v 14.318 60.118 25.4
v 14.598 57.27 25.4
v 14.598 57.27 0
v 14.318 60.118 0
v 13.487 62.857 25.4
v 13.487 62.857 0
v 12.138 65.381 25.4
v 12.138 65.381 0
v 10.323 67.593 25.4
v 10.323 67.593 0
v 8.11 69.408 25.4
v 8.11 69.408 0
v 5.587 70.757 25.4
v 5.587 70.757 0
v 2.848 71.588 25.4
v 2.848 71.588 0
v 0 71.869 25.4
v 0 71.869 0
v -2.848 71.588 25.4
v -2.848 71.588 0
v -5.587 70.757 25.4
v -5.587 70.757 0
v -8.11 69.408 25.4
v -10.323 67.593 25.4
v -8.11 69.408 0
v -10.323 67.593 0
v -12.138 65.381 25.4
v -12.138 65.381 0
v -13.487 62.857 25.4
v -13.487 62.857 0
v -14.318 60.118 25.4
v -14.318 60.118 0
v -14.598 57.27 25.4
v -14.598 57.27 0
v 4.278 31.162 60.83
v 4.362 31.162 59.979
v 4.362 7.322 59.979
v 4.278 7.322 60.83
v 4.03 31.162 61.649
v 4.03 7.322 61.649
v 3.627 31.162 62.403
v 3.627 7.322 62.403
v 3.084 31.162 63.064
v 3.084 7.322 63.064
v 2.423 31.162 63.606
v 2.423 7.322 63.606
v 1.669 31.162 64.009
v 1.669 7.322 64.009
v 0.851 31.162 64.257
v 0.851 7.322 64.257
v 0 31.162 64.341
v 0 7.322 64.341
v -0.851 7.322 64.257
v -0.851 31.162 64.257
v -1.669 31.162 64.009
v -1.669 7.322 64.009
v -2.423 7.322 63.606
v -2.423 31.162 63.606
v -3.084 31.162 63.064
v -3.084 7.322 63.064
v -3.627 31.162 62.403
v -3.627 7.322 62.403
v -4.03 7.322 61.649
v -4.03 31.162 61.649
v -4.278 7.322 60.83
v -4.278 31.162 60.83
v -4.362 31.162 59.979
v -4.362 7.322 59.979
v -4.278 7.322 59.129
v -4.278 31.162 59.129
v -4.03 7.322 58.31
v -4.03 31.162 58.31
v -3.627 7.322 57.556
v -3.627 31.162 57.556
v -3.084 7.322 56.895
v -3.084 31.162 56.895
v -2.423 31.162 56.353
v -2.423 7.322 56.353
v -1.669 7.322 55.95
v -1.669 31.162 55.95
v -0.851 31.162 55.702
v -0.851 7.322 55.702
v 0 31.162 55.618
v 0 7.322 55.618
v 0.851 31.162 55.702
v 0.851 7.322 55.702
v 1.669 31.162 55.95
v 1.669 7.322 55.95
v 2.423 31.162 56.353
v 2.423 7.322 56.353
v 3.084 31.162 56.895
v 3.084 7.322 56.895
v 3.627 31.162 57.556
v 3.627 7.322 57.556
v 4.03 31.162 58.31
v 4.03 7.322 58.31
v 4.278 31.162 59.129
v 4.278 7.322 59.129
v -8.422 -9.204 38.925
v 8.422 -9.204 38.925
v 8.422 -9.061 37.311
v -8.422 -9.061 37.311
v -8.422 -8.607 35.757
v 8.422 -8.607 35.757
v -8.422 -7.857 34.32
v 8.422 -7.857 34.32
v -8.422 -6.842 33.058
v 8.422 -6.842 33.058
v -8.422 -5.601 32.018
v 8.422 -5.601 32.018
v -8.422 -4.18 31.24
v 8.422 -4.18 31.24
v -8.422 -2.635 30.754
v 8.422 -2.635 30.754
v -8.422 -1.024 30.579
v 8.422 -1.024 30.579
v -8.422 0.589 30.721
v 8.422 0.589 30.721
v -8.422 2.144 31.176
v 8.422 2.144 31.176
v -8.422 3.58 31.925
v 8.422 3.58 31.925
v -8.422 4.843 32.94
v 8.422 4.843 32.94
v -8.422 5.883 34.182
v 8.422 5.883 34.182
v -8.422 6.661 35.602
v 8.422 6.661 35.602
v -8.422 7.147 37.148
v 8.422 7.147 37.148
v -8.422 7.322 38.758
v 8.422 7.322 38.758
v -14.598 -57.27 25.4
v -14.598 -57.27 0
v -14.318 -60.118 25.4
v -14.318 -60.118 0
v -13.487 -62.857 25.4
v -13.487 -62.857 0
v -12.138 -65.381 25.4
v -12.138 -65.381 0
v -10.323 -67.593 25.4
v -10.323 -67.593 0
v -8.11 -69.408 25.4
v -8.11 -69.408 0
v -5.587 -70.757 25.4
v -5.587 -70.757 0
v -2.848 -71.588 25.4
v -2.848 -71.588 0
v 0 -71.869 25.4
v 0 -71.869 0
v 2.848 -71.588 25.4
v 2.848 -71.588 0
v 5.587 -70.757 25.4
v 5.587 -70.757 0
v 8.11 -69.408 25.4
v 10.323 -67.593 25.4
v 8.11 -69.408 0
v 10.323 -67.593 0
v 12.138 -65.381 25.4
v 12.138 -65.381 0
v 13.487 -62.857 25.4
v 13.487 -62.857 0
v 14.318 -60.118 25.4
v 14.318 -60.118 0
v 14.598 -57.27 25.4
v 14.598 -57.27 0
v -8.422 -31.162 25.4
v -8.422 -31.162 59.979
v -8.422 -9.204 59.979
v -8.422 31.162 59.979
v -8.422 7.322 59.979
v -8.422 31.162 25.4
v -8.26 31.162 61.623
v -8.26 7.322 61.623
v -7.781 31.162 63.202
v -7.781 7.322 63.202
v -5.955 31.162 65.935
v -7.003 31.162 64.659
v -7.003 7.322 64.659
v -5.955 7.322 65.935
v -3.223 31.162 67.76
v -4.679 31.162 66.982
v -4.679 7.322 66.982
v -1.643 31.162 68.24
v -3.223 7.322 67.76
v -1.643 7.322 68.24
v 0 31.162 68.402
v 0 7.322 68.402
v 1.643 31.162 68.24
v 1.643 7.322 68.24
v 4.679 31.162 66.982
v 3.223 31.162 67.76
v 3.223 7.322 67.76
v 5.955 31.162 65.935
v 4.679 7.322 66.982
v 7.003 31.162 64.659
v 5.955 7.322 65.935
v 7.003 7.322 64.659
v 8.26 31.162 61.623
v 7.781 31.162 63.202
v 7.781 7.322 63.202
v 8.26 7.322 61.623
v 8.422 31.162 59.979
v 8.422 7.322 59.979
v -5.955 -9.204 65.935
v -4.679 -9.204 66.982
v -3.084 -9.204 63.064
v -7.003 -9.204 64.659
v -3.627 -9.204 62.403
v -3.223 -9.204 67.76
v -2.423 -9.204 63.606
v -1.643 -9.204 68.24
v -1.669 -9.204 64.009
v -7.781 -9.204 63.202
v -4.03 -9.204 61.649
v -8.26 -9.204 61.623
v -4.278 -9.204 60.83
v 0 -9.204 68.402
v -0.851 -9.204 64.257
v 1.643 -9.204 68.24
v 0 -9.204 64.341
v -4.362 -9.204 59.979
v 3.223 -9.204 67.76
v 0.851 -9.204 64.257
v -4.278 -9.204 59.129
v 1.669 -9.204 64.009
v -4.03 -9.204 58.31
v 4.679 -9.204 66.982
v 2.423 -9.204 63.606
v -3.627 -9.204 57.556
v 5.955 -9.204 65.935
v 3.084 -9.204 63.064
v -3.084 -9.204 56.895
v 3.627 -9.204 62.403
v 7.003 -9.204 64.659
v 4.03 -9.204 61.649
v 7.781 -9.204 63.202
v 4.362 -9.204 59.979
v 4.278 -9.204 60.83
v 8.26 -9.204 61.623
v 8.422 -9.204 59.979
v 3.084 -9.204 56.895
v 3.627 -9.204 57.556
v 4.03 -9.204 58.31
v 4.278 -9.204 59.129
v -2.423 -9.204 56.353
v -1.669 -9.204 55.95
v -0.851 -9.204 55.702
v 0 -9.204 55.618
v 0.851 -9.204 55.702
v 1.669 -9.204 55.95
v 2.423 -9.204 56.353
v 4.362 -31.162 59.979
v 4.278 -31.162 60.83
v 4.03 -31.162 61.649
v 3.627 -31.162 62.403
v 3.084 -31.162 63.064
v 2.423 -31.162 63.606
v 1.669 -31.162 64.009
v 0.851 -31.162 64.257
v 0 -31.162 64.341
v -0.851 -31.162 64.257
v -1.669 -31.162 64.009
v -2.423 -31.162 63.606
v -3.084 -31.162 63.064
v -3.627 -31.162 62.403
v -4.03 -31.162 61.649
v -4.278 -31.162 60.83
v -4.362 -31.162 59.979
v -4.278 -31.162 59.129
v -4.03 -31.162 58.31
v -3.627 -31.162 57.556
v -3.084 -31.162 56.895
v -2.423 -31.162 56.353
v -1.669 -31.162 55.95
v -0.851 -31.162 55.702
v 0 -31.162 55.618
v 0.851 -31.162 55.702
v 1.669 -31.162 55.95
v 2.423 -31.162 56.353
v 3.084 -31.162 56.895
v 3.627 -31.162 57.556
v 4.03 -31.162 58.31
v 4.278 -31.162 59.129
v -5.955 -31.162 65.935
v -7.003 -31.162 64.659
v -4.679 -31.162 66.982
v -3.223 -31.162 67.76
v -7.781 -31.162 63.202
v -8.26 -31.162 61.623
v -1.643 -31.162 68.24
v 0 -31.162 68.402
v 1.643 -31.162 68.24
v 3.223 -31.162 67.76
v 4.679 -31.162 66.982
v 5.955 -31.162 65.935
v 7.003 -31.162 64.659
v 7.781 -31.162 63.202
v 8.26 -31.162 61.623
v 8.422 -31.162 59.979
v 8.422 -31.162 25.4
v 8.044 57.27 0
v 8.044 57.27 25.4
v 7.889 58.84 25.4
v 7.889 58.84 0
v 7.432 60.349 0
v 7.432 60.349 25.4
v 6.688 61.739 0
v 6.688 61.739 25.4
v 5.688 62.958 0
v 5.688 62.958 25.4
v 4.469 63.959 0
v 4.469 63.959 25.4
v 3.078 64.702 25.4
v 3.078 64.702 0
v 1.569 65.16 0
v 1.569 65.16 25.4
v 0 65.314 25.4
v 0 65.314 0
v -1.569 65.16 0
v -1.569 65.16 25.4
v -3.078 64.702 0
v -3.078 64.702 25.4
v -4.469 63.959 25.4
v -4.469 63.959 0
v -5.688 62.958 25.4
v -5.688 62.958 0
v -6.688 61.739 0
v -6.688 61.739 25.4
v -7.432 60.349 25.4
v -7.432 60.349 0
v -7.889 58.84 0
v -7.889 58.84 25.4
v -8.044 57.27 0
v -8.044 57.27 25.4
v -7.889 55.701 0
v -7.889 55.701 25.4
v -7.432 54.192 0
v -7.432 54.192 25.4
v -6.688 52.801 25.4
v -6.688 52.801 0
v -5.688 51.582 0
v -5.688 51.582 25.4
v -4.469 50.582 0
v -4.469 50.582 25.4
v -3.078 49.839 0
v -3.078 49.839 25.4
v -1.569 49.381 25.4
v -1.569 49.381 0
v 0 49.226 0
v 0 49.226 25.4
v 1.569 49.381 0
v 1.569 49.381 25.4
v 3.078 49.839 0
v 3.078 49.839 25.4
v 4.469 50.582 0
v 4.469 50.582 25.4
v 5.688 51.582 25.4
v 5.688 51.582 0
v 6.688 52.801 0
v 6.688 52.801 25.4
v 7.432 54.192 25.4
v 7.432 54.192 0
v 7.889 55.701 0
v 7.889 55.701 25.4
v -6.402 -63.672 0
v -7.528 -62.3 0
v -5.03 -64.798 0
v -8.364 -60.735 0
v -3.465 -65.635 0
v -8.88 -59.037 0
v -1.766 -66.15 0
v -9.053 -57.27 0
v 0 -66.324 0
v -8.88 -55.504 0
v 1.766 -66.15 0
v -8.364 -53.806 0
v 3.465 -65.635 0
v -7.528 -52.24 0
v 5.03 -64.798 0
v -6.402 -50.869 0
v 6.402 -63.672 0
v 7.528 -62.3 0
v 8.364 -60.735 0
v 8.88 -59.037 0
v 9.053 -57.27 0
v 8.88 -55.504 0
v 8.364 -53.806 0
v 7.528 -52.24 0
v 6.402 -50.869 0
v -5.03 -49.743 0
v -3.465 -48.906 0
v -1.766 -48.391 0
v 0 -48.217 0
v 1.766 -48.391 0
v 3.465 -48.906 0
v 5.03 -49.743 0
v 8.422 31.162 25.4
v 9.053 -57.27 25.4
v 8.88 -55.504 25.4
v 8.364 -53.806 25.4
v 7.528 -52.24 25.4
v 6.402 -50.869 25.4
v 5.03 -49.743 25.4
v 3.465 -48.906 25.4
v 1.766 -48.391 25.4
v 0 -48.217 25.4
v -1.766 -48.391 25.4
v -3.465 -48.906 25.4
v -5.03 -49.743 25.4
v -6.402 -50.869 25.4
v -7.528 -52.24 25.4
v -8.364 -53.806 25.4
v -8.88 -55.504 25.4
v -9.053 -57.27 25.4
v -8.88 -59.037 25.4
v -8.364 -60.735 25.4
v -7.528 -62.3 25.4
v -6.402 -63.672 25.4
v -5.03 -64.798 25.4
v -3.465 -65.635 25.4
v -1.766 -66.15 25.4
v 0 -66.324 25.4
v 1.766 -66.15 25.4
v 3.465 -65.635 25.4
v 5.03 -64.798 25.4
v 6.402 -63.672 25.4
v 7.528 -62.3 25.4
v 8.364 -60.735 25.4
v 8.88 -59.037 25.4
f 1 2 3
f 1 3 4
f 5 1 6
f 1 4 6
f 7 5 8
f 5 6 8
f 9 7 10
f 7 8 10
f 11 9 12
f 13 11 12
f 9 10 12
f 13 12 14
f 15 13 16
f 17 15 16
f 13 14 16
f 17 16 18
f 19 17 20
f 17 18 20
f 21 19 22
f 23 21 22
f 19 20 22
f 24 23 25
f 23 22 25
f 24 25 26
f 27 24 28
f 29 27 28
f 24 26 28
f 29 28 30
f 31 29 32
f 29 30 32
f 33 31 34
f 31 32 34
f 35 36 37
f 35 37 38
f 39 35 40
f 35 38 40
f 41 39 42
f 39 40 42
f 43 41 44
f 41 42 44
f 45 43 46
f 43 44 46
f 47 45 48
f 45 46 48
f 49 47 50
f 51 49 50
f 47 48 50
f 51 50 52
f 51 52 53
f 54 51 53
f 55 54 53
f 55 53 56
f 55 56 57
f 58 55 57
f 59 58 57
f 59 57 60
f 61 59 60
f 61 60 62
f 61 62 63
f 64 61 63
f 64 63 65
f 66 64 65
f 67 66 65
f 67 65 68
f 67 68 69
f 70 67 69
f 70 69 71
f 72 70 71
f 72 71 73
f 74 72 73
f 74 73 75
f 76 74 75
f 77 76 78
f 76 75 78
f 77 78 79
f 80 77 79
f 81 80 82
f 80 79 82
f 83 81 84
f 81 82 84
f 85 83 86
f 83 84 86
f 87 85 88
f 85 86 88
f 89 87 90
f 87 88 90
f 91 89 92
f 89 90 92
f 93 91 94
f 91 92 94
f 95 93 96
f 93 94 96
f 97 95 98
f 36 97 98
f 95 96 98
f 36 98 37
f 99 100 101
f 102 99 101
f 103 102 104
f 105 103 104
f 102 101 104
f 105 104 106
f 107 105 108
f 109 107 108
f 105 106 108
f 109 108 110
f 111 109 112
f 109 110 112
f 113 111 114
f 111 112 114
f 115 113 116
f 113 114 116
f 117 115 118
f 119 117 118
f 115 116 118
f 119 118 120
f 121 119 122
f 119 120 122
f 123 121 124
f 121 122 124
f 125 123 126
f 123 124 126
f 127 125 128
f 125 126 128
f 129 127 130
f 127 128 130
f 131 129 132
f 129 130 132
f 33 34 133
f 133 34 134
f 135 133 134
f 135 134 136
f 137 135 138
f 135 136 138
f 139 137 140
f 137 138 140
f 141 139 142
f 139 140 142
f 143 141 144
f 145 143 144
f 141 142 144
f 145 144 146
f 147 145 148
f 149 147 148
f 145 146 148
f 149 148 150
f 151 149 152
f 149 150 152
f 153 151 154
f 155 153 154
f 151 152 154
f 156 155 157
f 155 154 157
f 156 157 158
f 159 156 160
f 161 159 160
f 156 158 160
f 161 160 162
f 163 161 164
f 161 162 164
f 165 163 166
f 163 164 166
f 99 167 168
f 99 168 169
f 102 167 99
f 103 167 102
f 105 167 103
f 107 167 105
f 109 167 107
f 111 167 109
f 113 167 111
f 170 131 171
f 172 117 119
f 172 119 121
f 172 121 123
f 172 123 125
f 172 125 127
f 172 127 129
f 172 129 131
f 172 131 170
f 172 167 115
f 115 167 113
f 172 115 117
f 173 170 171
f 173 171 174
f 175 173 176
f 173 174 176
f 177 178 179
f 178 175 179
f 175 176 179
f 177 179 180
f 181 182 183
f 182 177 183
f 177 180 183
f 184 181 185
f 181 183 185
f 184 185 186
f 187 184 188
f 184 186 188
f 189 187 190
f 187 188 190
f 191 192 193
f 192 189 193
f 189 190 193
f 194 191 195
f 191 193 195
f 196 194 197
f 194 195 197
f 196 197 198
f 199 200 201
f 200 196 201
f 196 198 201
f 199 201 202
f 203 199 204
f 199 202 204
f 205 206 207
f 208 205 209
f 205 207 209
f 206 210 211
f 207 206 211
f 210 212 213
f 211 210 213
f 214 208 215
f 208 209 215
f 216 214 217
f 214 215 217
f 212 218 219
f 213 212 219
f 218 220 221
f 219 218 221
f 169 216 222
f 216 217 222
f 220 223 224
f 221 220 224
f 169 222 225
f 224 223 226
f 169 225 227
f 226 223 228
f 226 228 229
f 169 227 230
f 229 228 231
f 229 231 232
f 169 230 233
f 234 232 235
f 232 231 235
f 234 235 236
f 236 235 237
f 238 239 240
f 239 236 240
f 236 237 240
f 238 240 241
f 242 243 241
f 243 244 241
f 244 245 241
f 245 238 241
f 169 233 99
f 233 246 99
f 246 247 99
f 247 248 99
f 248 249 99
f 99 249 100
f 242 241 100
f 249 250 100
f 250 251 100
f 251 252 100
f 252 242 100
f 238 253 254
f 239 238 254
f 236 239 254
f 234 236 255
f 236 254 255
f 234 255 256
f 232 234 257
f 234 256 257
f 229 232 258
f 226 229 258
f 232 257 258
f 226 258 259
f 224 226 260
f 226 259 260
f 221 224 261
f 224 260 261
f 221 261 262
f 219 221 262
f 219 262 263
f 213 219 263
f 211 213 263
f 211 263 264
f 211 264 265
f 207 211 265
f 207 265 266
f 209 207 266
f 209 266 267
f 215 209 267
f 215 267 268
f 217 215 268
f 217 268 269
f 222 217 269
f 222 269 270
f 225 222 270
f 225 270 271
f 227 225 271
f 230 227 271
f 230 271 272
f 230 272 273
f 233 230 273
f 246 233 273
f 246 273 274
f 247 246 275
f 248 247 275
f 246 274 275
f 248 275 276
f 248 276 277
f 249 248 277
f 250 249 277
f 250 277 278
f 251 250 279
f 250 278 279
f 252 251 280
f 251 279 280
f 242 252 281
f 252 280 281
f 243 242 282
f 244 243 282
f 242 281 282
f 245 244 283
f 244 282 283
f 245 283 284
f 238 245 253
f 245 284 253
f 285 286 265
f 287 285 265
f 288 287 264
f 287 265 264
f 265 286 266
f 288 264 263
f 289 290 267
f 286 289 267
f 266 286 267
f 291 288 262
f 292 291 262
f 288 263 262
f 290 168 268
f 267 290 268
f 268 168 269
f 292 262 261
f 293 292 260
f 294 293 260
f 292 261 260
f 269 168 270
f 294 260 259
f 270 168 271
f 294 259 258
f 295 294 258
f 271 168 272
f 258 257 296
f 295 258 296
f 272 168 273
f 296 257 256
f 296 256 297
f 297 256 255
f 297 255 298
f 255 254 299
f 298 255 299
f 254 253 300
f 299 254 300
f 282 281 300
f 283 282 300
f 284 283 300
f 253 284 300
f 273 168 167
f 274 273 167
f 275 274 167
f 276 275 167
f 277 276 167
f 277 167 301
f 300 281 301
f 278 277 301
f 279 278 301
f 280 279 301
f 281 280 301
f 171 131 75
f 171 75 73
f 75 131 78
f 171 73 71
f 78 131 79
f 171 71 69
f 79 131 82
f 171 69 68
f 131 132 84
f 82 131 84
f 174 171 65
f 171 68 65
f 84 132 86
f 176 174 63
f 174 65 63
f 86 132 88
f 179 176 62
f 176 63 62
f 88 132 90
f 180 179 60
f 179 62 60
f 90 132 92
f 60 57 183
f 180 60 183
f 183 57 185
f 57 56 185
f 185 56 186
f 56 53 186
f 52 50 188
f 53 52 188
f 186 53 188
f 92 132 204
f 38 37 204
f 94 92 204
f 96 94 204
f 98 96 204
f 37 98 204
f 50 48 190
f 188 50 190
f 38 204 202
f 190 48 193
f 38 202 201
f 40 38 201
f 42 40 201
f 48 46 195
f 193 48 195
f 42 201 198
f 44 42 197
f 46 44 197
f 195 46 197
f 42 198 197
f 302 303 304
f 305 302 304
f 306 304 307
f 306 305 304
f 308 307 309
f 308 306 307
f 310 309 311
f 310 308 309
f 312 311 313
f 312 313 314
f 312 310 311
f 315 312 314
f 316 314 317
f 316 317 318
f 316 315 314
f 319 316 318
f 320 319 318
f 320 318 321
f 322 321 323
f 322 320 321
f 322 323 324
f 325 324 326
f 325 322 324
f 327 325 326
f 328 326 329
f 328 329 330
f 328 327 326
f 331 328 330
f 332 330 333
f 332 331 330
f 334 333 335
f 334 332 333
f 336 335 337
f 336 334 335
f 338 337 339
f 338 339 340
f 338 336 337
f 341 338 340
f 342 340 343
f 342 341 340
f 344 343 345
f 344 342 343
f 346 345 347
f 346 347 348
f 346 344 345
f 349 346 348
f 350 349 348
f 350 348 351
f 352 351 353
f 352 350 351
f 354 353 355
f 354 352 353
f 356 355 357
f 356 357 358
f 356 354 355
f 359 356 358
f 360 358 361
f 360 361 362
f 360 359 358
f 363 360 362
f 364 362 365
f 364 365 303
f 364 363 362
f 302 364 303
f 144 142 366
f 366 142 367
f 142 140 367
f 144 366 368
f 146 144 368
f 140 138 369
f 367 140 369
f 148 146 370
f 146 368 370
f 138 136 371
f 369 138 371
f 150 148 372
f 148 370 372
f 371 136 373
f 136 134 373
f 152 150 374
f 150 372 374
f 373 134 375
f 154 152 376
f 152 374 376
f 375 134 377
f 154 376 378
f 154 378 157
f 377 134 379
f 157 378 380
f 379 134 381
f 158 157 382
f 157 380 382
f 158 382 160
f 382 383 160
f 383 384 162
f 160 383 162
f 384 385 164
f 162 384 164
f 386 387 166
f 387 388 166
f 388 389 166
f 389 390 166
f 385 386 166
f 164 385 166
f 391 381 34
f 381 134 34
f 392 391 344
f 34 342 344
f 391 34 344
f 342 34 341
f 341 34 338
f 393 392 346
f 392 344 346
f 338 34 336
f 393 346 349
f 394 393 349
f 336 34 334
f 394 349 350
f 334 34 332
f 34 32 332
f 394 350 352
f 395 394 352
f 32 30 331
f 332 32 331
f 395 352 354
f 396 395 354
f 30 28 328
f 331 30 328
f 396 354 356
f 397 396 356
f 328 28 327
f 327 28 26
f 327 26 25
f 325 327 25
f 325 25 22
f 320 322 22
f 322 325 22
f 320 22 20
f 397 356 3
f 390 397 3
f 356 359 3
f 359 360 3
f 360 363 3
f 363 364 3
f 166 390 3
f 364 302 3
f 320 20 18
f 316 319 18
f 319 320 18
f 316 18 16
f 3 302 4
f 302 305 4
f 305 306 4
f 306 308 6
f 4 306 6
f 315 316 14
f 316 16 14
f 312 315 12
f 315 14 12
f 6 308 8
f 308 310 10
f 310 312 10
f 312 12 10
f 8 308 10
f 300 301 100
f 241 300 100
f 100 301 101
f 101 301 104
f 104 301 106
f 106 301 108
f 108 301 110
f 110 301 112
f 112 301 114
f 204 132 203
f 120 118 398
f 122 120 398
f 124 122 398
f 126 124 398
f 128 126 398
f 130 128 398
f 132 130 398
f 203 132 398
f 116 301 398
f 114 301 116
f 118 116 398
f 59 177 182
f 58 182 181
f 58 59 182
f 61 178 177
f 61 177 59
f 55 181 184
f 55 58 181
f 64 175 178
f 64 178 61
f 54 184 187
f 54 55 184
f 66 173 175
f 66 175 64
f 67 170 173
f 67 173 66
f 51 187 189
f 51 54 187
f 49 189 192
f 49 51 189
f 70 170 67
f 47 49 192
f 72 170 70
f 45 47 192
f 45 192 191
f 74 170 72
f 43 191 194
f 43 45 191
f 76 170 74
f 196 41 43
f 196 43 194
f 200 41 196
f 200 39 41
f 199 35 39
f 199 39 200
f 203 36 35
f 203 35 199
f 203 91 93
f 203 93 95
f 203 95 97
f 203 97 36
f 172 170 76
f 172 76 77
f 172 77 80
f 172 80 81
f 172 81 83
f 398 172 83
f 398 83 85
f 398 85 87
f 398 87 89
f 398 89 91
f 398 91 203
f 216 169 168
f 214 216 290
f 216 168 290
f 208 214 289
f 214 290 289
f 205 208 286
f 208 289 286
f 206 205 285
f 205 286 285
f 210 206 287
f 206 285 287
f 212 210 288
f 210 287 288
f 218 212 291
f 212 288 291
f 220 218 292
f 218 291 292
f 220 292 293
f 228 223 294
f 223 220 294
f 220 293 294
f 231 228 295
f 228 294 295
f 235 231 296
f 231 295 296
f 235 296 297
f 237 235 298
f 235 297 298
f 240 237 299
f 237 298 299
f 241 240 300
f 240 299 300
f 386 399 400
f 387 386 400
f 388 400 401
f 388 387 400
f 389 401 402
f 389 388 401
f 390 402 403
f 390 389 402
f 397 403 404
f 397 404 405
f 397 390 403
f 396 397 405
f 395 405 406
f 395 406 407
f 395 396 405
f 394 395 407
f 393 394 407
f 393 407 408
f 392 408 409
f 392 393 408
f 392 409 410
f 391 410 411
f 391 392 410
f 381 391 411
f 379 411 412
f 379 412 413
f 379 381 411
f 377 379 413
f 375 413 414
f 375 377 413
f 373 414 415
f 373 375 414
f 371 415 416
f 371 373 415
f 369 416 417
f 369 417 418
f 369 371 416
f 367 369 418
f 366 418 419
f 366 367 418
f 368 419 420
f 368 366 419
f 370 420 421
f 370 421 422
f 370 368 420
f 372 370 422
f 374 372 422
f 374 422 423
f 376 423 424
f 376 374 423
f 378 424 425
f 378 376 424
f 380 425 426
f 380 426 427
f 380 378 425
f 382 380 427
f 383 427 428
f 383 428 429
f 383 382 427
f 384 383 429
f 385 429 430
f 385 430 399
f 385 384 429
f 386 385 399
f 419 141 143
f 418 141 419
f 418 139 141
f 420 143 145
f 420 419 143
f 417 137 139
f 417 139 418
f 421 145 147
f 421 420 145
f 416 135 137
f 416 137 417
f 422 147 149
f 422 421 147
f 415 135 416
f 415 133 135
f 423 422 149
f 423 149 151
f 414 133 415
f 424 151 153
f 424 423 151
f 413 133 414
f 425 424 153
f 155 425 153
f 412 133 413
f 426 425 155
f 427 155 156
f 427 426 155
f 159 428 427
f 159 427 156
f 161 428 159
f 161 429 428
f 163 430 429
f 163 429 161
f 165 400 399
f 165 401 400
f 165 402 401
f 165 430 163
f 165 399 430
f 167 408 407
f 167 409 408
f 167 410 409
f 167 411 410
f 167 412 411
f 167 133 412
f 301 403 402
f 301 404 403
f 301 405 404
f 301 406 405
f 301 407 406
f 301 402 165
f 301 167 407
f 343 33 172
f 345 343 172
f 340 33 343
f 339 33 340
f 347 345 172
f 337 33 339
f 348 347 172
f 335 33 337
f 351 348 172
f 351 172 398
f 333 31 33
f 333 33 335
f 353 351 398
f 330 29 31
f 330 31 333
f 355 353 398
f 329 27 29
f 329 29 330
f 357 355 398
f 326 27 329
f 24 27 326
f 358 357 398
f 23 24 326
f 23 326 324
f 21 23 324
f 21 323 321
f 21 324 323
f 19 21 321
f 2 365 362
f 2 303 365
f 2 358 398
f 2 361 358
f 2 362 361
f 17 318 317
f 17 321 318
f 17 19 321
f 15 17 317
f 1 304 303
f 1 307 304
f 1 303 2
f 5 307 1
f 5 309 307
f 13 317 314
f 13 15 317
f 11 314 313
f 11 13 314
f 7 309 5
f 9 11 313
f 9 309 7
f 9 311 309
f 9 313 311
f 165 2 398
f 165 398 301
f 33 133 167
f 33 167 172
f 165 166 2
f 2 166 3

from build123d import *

# Parameters (mm, degrees)
F0_R     = 9.053492
F0_R_2   = 8.043979
F1_DEPTH = 25.4
F2_W     = 16.844214
F2_H     = 62.323578
F3_DEPTH = 45.974
F5_DEPTH = 25.4
F6_R     = 4.361734
F7_DEPTH = 85.598


with BuildPart() as f1:
    # F0 (on Top) → F1 (new body)
    with BuildSketch(Plane.XY):
        with BuildLine():
            Line((14.598317, -57.270318), (14.598317, 57.270318))
            ThreePointArc((14.598317, 57.270318), (0, 71.868635), (-14.598317, 57.270318))
            Line((-14.598317, 57.270318), (-14.598317, -57.270318))
            ThreePointArc((-14.598317, -57.270318), (0, -71.868635), (14.598317, -57.270318))
        make_face()
        with Locations((0, -57.270318)):
            Circle(F0_R, mode=Mode.SUBTRACT)
        with Locations((0, 57.270318)):
            Circle(F0_R_2, mode=Mode.SUBTRACT)
    extrude(amount=F1_DEPTH)

    # F2 (on face) → F3 (join)
    with BuildSketch(Plane.XY.offset(25.4)):
        Rectangle(F2_W, F2_H)
    extrude(amount=F3_DEPTH)

    # F4 (on face) → F5 (cut)
    with BuildSketch(Plane.YZ.offset(8.422107)):
        with BuildLine():
            Line((7.322163, 71.374), (-9.203623, 71.374))
            Line((-9.203623, 71.374), (-9.203623, 38.925104))
            ThreePointArc((-9.203623, 38.925104), (-1.024193, 30.578748), (7.322163, 38.758177))
            Line((7.322163, 38.758177), (7.322163, 71.374))
        make_face()
    extrude(amount=-F5_DEPTH, mode=Mode.SUBTRACT)

    # F6 (on face) → F7 (cut)
    with BuildSketch(Plane.XZ.offset(31.161789)):
        with BuildLine():
            Line((-8.422107, 71.374), (-8.422107, 59.979465))
            ThreePointArc((-8.422107, 59.979465), (0, 68.401572), (8.422107, 59.979465))
            Line((8.422107, 59.979465), (8.422107, 71.374))
            Line((8.422107, 71.374), (-8.422107, 71.374))
        make_face()
        with Locations((0, 59.979465)):
            Circle(F6_R)
    extrude(amount=-F7_DEPTH, mode=Mode.SUBTRACT)


solid = f1.part
